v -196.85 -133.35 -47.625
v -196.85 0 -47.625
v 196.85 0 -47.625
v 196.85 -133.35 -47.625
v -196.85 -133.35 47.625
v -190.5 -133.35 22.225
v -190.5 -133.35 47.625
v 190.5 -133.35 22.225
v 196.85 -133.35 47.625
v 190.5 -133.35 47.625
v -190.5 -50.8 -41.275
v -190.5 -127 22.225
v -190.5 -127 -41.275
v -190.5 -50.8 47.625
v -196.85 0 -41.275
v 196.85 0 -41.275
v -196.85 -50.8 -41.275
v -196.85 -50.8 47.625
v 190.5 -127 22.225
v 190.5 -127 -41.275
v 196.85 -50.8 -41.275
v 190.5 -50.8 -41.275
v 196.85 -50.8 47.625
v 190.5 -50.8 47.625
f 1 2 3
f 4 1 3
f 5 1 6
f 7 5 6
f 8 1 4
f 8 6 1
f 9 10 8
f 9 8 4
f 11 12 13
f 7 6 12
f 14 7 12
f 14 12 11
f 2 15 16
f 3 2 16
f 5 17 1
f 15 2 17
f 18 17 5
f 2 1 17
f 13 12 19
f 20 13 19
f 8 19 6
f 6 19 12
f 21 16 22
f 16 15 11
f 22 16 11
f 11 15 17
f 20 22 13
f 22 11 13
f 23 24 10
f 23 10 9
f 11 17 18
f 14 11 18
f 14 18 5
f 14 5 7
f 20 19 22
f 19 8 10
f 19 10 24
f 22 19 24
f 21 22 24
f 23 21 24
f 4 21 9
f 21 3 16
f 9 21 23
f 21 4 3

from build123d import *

# Parameters (mm, degrees)
F0_W     = 393.7
F0_H     = 95.25
F1_DEPTH = 133.35
F2_W     = 381
F2_H     = 127
F3_DEPTH = 88.9
F4_W     = 50.8
F4_H     = 88.9
F5_DEPTH = 406.4
F6_W     = 381
F6_H     = 25.4
F7_DEPTH = 25.4


with BuildPart() as f1:
    # F0 (on Front) → F1 (new body)
    with BuildSketch(Plane.XZ):
        Rectangle(F0_W, F0_H)
    extrude(amount=F1_DEPTH)

    # F2 (on face) → F3 (cut)
    with BuildSketch(Plane.XY.offset(47.625)):
        with Locations((0, -63.5)):
            Rectangle(F2_W, F2_H)
    extrude(amount=-F3_DEPTH, mode=Mode.SUBTRACT)

    # F4 (on face) → F5 (cut)
    with BuildSketch(Plane(origin=(-196.85, 0, 0), x_dir=(0, -1, 0), z_dir=(-1, 0, 0))):
        with Locations((25.4, 3.175)):
            Rectangle(F4_W, F4_H)
    extrude(amount=-F5_DEPTH, mode=Mode.SUBTRACT)

    # F6 (on face) → F7 (cut)
    with BuildSketch(Plane(origin=(0, -127, 0), x_dir=(-1, 0, 0), z_dir=(0, 1, 0))):
        with Locations((0, 34.925)):
            Rectangle(F6_W, F6_H)
    extrude(amount=-F7_DEPTH, mode=Mode.SUBTRACT)


solid = f1.part
